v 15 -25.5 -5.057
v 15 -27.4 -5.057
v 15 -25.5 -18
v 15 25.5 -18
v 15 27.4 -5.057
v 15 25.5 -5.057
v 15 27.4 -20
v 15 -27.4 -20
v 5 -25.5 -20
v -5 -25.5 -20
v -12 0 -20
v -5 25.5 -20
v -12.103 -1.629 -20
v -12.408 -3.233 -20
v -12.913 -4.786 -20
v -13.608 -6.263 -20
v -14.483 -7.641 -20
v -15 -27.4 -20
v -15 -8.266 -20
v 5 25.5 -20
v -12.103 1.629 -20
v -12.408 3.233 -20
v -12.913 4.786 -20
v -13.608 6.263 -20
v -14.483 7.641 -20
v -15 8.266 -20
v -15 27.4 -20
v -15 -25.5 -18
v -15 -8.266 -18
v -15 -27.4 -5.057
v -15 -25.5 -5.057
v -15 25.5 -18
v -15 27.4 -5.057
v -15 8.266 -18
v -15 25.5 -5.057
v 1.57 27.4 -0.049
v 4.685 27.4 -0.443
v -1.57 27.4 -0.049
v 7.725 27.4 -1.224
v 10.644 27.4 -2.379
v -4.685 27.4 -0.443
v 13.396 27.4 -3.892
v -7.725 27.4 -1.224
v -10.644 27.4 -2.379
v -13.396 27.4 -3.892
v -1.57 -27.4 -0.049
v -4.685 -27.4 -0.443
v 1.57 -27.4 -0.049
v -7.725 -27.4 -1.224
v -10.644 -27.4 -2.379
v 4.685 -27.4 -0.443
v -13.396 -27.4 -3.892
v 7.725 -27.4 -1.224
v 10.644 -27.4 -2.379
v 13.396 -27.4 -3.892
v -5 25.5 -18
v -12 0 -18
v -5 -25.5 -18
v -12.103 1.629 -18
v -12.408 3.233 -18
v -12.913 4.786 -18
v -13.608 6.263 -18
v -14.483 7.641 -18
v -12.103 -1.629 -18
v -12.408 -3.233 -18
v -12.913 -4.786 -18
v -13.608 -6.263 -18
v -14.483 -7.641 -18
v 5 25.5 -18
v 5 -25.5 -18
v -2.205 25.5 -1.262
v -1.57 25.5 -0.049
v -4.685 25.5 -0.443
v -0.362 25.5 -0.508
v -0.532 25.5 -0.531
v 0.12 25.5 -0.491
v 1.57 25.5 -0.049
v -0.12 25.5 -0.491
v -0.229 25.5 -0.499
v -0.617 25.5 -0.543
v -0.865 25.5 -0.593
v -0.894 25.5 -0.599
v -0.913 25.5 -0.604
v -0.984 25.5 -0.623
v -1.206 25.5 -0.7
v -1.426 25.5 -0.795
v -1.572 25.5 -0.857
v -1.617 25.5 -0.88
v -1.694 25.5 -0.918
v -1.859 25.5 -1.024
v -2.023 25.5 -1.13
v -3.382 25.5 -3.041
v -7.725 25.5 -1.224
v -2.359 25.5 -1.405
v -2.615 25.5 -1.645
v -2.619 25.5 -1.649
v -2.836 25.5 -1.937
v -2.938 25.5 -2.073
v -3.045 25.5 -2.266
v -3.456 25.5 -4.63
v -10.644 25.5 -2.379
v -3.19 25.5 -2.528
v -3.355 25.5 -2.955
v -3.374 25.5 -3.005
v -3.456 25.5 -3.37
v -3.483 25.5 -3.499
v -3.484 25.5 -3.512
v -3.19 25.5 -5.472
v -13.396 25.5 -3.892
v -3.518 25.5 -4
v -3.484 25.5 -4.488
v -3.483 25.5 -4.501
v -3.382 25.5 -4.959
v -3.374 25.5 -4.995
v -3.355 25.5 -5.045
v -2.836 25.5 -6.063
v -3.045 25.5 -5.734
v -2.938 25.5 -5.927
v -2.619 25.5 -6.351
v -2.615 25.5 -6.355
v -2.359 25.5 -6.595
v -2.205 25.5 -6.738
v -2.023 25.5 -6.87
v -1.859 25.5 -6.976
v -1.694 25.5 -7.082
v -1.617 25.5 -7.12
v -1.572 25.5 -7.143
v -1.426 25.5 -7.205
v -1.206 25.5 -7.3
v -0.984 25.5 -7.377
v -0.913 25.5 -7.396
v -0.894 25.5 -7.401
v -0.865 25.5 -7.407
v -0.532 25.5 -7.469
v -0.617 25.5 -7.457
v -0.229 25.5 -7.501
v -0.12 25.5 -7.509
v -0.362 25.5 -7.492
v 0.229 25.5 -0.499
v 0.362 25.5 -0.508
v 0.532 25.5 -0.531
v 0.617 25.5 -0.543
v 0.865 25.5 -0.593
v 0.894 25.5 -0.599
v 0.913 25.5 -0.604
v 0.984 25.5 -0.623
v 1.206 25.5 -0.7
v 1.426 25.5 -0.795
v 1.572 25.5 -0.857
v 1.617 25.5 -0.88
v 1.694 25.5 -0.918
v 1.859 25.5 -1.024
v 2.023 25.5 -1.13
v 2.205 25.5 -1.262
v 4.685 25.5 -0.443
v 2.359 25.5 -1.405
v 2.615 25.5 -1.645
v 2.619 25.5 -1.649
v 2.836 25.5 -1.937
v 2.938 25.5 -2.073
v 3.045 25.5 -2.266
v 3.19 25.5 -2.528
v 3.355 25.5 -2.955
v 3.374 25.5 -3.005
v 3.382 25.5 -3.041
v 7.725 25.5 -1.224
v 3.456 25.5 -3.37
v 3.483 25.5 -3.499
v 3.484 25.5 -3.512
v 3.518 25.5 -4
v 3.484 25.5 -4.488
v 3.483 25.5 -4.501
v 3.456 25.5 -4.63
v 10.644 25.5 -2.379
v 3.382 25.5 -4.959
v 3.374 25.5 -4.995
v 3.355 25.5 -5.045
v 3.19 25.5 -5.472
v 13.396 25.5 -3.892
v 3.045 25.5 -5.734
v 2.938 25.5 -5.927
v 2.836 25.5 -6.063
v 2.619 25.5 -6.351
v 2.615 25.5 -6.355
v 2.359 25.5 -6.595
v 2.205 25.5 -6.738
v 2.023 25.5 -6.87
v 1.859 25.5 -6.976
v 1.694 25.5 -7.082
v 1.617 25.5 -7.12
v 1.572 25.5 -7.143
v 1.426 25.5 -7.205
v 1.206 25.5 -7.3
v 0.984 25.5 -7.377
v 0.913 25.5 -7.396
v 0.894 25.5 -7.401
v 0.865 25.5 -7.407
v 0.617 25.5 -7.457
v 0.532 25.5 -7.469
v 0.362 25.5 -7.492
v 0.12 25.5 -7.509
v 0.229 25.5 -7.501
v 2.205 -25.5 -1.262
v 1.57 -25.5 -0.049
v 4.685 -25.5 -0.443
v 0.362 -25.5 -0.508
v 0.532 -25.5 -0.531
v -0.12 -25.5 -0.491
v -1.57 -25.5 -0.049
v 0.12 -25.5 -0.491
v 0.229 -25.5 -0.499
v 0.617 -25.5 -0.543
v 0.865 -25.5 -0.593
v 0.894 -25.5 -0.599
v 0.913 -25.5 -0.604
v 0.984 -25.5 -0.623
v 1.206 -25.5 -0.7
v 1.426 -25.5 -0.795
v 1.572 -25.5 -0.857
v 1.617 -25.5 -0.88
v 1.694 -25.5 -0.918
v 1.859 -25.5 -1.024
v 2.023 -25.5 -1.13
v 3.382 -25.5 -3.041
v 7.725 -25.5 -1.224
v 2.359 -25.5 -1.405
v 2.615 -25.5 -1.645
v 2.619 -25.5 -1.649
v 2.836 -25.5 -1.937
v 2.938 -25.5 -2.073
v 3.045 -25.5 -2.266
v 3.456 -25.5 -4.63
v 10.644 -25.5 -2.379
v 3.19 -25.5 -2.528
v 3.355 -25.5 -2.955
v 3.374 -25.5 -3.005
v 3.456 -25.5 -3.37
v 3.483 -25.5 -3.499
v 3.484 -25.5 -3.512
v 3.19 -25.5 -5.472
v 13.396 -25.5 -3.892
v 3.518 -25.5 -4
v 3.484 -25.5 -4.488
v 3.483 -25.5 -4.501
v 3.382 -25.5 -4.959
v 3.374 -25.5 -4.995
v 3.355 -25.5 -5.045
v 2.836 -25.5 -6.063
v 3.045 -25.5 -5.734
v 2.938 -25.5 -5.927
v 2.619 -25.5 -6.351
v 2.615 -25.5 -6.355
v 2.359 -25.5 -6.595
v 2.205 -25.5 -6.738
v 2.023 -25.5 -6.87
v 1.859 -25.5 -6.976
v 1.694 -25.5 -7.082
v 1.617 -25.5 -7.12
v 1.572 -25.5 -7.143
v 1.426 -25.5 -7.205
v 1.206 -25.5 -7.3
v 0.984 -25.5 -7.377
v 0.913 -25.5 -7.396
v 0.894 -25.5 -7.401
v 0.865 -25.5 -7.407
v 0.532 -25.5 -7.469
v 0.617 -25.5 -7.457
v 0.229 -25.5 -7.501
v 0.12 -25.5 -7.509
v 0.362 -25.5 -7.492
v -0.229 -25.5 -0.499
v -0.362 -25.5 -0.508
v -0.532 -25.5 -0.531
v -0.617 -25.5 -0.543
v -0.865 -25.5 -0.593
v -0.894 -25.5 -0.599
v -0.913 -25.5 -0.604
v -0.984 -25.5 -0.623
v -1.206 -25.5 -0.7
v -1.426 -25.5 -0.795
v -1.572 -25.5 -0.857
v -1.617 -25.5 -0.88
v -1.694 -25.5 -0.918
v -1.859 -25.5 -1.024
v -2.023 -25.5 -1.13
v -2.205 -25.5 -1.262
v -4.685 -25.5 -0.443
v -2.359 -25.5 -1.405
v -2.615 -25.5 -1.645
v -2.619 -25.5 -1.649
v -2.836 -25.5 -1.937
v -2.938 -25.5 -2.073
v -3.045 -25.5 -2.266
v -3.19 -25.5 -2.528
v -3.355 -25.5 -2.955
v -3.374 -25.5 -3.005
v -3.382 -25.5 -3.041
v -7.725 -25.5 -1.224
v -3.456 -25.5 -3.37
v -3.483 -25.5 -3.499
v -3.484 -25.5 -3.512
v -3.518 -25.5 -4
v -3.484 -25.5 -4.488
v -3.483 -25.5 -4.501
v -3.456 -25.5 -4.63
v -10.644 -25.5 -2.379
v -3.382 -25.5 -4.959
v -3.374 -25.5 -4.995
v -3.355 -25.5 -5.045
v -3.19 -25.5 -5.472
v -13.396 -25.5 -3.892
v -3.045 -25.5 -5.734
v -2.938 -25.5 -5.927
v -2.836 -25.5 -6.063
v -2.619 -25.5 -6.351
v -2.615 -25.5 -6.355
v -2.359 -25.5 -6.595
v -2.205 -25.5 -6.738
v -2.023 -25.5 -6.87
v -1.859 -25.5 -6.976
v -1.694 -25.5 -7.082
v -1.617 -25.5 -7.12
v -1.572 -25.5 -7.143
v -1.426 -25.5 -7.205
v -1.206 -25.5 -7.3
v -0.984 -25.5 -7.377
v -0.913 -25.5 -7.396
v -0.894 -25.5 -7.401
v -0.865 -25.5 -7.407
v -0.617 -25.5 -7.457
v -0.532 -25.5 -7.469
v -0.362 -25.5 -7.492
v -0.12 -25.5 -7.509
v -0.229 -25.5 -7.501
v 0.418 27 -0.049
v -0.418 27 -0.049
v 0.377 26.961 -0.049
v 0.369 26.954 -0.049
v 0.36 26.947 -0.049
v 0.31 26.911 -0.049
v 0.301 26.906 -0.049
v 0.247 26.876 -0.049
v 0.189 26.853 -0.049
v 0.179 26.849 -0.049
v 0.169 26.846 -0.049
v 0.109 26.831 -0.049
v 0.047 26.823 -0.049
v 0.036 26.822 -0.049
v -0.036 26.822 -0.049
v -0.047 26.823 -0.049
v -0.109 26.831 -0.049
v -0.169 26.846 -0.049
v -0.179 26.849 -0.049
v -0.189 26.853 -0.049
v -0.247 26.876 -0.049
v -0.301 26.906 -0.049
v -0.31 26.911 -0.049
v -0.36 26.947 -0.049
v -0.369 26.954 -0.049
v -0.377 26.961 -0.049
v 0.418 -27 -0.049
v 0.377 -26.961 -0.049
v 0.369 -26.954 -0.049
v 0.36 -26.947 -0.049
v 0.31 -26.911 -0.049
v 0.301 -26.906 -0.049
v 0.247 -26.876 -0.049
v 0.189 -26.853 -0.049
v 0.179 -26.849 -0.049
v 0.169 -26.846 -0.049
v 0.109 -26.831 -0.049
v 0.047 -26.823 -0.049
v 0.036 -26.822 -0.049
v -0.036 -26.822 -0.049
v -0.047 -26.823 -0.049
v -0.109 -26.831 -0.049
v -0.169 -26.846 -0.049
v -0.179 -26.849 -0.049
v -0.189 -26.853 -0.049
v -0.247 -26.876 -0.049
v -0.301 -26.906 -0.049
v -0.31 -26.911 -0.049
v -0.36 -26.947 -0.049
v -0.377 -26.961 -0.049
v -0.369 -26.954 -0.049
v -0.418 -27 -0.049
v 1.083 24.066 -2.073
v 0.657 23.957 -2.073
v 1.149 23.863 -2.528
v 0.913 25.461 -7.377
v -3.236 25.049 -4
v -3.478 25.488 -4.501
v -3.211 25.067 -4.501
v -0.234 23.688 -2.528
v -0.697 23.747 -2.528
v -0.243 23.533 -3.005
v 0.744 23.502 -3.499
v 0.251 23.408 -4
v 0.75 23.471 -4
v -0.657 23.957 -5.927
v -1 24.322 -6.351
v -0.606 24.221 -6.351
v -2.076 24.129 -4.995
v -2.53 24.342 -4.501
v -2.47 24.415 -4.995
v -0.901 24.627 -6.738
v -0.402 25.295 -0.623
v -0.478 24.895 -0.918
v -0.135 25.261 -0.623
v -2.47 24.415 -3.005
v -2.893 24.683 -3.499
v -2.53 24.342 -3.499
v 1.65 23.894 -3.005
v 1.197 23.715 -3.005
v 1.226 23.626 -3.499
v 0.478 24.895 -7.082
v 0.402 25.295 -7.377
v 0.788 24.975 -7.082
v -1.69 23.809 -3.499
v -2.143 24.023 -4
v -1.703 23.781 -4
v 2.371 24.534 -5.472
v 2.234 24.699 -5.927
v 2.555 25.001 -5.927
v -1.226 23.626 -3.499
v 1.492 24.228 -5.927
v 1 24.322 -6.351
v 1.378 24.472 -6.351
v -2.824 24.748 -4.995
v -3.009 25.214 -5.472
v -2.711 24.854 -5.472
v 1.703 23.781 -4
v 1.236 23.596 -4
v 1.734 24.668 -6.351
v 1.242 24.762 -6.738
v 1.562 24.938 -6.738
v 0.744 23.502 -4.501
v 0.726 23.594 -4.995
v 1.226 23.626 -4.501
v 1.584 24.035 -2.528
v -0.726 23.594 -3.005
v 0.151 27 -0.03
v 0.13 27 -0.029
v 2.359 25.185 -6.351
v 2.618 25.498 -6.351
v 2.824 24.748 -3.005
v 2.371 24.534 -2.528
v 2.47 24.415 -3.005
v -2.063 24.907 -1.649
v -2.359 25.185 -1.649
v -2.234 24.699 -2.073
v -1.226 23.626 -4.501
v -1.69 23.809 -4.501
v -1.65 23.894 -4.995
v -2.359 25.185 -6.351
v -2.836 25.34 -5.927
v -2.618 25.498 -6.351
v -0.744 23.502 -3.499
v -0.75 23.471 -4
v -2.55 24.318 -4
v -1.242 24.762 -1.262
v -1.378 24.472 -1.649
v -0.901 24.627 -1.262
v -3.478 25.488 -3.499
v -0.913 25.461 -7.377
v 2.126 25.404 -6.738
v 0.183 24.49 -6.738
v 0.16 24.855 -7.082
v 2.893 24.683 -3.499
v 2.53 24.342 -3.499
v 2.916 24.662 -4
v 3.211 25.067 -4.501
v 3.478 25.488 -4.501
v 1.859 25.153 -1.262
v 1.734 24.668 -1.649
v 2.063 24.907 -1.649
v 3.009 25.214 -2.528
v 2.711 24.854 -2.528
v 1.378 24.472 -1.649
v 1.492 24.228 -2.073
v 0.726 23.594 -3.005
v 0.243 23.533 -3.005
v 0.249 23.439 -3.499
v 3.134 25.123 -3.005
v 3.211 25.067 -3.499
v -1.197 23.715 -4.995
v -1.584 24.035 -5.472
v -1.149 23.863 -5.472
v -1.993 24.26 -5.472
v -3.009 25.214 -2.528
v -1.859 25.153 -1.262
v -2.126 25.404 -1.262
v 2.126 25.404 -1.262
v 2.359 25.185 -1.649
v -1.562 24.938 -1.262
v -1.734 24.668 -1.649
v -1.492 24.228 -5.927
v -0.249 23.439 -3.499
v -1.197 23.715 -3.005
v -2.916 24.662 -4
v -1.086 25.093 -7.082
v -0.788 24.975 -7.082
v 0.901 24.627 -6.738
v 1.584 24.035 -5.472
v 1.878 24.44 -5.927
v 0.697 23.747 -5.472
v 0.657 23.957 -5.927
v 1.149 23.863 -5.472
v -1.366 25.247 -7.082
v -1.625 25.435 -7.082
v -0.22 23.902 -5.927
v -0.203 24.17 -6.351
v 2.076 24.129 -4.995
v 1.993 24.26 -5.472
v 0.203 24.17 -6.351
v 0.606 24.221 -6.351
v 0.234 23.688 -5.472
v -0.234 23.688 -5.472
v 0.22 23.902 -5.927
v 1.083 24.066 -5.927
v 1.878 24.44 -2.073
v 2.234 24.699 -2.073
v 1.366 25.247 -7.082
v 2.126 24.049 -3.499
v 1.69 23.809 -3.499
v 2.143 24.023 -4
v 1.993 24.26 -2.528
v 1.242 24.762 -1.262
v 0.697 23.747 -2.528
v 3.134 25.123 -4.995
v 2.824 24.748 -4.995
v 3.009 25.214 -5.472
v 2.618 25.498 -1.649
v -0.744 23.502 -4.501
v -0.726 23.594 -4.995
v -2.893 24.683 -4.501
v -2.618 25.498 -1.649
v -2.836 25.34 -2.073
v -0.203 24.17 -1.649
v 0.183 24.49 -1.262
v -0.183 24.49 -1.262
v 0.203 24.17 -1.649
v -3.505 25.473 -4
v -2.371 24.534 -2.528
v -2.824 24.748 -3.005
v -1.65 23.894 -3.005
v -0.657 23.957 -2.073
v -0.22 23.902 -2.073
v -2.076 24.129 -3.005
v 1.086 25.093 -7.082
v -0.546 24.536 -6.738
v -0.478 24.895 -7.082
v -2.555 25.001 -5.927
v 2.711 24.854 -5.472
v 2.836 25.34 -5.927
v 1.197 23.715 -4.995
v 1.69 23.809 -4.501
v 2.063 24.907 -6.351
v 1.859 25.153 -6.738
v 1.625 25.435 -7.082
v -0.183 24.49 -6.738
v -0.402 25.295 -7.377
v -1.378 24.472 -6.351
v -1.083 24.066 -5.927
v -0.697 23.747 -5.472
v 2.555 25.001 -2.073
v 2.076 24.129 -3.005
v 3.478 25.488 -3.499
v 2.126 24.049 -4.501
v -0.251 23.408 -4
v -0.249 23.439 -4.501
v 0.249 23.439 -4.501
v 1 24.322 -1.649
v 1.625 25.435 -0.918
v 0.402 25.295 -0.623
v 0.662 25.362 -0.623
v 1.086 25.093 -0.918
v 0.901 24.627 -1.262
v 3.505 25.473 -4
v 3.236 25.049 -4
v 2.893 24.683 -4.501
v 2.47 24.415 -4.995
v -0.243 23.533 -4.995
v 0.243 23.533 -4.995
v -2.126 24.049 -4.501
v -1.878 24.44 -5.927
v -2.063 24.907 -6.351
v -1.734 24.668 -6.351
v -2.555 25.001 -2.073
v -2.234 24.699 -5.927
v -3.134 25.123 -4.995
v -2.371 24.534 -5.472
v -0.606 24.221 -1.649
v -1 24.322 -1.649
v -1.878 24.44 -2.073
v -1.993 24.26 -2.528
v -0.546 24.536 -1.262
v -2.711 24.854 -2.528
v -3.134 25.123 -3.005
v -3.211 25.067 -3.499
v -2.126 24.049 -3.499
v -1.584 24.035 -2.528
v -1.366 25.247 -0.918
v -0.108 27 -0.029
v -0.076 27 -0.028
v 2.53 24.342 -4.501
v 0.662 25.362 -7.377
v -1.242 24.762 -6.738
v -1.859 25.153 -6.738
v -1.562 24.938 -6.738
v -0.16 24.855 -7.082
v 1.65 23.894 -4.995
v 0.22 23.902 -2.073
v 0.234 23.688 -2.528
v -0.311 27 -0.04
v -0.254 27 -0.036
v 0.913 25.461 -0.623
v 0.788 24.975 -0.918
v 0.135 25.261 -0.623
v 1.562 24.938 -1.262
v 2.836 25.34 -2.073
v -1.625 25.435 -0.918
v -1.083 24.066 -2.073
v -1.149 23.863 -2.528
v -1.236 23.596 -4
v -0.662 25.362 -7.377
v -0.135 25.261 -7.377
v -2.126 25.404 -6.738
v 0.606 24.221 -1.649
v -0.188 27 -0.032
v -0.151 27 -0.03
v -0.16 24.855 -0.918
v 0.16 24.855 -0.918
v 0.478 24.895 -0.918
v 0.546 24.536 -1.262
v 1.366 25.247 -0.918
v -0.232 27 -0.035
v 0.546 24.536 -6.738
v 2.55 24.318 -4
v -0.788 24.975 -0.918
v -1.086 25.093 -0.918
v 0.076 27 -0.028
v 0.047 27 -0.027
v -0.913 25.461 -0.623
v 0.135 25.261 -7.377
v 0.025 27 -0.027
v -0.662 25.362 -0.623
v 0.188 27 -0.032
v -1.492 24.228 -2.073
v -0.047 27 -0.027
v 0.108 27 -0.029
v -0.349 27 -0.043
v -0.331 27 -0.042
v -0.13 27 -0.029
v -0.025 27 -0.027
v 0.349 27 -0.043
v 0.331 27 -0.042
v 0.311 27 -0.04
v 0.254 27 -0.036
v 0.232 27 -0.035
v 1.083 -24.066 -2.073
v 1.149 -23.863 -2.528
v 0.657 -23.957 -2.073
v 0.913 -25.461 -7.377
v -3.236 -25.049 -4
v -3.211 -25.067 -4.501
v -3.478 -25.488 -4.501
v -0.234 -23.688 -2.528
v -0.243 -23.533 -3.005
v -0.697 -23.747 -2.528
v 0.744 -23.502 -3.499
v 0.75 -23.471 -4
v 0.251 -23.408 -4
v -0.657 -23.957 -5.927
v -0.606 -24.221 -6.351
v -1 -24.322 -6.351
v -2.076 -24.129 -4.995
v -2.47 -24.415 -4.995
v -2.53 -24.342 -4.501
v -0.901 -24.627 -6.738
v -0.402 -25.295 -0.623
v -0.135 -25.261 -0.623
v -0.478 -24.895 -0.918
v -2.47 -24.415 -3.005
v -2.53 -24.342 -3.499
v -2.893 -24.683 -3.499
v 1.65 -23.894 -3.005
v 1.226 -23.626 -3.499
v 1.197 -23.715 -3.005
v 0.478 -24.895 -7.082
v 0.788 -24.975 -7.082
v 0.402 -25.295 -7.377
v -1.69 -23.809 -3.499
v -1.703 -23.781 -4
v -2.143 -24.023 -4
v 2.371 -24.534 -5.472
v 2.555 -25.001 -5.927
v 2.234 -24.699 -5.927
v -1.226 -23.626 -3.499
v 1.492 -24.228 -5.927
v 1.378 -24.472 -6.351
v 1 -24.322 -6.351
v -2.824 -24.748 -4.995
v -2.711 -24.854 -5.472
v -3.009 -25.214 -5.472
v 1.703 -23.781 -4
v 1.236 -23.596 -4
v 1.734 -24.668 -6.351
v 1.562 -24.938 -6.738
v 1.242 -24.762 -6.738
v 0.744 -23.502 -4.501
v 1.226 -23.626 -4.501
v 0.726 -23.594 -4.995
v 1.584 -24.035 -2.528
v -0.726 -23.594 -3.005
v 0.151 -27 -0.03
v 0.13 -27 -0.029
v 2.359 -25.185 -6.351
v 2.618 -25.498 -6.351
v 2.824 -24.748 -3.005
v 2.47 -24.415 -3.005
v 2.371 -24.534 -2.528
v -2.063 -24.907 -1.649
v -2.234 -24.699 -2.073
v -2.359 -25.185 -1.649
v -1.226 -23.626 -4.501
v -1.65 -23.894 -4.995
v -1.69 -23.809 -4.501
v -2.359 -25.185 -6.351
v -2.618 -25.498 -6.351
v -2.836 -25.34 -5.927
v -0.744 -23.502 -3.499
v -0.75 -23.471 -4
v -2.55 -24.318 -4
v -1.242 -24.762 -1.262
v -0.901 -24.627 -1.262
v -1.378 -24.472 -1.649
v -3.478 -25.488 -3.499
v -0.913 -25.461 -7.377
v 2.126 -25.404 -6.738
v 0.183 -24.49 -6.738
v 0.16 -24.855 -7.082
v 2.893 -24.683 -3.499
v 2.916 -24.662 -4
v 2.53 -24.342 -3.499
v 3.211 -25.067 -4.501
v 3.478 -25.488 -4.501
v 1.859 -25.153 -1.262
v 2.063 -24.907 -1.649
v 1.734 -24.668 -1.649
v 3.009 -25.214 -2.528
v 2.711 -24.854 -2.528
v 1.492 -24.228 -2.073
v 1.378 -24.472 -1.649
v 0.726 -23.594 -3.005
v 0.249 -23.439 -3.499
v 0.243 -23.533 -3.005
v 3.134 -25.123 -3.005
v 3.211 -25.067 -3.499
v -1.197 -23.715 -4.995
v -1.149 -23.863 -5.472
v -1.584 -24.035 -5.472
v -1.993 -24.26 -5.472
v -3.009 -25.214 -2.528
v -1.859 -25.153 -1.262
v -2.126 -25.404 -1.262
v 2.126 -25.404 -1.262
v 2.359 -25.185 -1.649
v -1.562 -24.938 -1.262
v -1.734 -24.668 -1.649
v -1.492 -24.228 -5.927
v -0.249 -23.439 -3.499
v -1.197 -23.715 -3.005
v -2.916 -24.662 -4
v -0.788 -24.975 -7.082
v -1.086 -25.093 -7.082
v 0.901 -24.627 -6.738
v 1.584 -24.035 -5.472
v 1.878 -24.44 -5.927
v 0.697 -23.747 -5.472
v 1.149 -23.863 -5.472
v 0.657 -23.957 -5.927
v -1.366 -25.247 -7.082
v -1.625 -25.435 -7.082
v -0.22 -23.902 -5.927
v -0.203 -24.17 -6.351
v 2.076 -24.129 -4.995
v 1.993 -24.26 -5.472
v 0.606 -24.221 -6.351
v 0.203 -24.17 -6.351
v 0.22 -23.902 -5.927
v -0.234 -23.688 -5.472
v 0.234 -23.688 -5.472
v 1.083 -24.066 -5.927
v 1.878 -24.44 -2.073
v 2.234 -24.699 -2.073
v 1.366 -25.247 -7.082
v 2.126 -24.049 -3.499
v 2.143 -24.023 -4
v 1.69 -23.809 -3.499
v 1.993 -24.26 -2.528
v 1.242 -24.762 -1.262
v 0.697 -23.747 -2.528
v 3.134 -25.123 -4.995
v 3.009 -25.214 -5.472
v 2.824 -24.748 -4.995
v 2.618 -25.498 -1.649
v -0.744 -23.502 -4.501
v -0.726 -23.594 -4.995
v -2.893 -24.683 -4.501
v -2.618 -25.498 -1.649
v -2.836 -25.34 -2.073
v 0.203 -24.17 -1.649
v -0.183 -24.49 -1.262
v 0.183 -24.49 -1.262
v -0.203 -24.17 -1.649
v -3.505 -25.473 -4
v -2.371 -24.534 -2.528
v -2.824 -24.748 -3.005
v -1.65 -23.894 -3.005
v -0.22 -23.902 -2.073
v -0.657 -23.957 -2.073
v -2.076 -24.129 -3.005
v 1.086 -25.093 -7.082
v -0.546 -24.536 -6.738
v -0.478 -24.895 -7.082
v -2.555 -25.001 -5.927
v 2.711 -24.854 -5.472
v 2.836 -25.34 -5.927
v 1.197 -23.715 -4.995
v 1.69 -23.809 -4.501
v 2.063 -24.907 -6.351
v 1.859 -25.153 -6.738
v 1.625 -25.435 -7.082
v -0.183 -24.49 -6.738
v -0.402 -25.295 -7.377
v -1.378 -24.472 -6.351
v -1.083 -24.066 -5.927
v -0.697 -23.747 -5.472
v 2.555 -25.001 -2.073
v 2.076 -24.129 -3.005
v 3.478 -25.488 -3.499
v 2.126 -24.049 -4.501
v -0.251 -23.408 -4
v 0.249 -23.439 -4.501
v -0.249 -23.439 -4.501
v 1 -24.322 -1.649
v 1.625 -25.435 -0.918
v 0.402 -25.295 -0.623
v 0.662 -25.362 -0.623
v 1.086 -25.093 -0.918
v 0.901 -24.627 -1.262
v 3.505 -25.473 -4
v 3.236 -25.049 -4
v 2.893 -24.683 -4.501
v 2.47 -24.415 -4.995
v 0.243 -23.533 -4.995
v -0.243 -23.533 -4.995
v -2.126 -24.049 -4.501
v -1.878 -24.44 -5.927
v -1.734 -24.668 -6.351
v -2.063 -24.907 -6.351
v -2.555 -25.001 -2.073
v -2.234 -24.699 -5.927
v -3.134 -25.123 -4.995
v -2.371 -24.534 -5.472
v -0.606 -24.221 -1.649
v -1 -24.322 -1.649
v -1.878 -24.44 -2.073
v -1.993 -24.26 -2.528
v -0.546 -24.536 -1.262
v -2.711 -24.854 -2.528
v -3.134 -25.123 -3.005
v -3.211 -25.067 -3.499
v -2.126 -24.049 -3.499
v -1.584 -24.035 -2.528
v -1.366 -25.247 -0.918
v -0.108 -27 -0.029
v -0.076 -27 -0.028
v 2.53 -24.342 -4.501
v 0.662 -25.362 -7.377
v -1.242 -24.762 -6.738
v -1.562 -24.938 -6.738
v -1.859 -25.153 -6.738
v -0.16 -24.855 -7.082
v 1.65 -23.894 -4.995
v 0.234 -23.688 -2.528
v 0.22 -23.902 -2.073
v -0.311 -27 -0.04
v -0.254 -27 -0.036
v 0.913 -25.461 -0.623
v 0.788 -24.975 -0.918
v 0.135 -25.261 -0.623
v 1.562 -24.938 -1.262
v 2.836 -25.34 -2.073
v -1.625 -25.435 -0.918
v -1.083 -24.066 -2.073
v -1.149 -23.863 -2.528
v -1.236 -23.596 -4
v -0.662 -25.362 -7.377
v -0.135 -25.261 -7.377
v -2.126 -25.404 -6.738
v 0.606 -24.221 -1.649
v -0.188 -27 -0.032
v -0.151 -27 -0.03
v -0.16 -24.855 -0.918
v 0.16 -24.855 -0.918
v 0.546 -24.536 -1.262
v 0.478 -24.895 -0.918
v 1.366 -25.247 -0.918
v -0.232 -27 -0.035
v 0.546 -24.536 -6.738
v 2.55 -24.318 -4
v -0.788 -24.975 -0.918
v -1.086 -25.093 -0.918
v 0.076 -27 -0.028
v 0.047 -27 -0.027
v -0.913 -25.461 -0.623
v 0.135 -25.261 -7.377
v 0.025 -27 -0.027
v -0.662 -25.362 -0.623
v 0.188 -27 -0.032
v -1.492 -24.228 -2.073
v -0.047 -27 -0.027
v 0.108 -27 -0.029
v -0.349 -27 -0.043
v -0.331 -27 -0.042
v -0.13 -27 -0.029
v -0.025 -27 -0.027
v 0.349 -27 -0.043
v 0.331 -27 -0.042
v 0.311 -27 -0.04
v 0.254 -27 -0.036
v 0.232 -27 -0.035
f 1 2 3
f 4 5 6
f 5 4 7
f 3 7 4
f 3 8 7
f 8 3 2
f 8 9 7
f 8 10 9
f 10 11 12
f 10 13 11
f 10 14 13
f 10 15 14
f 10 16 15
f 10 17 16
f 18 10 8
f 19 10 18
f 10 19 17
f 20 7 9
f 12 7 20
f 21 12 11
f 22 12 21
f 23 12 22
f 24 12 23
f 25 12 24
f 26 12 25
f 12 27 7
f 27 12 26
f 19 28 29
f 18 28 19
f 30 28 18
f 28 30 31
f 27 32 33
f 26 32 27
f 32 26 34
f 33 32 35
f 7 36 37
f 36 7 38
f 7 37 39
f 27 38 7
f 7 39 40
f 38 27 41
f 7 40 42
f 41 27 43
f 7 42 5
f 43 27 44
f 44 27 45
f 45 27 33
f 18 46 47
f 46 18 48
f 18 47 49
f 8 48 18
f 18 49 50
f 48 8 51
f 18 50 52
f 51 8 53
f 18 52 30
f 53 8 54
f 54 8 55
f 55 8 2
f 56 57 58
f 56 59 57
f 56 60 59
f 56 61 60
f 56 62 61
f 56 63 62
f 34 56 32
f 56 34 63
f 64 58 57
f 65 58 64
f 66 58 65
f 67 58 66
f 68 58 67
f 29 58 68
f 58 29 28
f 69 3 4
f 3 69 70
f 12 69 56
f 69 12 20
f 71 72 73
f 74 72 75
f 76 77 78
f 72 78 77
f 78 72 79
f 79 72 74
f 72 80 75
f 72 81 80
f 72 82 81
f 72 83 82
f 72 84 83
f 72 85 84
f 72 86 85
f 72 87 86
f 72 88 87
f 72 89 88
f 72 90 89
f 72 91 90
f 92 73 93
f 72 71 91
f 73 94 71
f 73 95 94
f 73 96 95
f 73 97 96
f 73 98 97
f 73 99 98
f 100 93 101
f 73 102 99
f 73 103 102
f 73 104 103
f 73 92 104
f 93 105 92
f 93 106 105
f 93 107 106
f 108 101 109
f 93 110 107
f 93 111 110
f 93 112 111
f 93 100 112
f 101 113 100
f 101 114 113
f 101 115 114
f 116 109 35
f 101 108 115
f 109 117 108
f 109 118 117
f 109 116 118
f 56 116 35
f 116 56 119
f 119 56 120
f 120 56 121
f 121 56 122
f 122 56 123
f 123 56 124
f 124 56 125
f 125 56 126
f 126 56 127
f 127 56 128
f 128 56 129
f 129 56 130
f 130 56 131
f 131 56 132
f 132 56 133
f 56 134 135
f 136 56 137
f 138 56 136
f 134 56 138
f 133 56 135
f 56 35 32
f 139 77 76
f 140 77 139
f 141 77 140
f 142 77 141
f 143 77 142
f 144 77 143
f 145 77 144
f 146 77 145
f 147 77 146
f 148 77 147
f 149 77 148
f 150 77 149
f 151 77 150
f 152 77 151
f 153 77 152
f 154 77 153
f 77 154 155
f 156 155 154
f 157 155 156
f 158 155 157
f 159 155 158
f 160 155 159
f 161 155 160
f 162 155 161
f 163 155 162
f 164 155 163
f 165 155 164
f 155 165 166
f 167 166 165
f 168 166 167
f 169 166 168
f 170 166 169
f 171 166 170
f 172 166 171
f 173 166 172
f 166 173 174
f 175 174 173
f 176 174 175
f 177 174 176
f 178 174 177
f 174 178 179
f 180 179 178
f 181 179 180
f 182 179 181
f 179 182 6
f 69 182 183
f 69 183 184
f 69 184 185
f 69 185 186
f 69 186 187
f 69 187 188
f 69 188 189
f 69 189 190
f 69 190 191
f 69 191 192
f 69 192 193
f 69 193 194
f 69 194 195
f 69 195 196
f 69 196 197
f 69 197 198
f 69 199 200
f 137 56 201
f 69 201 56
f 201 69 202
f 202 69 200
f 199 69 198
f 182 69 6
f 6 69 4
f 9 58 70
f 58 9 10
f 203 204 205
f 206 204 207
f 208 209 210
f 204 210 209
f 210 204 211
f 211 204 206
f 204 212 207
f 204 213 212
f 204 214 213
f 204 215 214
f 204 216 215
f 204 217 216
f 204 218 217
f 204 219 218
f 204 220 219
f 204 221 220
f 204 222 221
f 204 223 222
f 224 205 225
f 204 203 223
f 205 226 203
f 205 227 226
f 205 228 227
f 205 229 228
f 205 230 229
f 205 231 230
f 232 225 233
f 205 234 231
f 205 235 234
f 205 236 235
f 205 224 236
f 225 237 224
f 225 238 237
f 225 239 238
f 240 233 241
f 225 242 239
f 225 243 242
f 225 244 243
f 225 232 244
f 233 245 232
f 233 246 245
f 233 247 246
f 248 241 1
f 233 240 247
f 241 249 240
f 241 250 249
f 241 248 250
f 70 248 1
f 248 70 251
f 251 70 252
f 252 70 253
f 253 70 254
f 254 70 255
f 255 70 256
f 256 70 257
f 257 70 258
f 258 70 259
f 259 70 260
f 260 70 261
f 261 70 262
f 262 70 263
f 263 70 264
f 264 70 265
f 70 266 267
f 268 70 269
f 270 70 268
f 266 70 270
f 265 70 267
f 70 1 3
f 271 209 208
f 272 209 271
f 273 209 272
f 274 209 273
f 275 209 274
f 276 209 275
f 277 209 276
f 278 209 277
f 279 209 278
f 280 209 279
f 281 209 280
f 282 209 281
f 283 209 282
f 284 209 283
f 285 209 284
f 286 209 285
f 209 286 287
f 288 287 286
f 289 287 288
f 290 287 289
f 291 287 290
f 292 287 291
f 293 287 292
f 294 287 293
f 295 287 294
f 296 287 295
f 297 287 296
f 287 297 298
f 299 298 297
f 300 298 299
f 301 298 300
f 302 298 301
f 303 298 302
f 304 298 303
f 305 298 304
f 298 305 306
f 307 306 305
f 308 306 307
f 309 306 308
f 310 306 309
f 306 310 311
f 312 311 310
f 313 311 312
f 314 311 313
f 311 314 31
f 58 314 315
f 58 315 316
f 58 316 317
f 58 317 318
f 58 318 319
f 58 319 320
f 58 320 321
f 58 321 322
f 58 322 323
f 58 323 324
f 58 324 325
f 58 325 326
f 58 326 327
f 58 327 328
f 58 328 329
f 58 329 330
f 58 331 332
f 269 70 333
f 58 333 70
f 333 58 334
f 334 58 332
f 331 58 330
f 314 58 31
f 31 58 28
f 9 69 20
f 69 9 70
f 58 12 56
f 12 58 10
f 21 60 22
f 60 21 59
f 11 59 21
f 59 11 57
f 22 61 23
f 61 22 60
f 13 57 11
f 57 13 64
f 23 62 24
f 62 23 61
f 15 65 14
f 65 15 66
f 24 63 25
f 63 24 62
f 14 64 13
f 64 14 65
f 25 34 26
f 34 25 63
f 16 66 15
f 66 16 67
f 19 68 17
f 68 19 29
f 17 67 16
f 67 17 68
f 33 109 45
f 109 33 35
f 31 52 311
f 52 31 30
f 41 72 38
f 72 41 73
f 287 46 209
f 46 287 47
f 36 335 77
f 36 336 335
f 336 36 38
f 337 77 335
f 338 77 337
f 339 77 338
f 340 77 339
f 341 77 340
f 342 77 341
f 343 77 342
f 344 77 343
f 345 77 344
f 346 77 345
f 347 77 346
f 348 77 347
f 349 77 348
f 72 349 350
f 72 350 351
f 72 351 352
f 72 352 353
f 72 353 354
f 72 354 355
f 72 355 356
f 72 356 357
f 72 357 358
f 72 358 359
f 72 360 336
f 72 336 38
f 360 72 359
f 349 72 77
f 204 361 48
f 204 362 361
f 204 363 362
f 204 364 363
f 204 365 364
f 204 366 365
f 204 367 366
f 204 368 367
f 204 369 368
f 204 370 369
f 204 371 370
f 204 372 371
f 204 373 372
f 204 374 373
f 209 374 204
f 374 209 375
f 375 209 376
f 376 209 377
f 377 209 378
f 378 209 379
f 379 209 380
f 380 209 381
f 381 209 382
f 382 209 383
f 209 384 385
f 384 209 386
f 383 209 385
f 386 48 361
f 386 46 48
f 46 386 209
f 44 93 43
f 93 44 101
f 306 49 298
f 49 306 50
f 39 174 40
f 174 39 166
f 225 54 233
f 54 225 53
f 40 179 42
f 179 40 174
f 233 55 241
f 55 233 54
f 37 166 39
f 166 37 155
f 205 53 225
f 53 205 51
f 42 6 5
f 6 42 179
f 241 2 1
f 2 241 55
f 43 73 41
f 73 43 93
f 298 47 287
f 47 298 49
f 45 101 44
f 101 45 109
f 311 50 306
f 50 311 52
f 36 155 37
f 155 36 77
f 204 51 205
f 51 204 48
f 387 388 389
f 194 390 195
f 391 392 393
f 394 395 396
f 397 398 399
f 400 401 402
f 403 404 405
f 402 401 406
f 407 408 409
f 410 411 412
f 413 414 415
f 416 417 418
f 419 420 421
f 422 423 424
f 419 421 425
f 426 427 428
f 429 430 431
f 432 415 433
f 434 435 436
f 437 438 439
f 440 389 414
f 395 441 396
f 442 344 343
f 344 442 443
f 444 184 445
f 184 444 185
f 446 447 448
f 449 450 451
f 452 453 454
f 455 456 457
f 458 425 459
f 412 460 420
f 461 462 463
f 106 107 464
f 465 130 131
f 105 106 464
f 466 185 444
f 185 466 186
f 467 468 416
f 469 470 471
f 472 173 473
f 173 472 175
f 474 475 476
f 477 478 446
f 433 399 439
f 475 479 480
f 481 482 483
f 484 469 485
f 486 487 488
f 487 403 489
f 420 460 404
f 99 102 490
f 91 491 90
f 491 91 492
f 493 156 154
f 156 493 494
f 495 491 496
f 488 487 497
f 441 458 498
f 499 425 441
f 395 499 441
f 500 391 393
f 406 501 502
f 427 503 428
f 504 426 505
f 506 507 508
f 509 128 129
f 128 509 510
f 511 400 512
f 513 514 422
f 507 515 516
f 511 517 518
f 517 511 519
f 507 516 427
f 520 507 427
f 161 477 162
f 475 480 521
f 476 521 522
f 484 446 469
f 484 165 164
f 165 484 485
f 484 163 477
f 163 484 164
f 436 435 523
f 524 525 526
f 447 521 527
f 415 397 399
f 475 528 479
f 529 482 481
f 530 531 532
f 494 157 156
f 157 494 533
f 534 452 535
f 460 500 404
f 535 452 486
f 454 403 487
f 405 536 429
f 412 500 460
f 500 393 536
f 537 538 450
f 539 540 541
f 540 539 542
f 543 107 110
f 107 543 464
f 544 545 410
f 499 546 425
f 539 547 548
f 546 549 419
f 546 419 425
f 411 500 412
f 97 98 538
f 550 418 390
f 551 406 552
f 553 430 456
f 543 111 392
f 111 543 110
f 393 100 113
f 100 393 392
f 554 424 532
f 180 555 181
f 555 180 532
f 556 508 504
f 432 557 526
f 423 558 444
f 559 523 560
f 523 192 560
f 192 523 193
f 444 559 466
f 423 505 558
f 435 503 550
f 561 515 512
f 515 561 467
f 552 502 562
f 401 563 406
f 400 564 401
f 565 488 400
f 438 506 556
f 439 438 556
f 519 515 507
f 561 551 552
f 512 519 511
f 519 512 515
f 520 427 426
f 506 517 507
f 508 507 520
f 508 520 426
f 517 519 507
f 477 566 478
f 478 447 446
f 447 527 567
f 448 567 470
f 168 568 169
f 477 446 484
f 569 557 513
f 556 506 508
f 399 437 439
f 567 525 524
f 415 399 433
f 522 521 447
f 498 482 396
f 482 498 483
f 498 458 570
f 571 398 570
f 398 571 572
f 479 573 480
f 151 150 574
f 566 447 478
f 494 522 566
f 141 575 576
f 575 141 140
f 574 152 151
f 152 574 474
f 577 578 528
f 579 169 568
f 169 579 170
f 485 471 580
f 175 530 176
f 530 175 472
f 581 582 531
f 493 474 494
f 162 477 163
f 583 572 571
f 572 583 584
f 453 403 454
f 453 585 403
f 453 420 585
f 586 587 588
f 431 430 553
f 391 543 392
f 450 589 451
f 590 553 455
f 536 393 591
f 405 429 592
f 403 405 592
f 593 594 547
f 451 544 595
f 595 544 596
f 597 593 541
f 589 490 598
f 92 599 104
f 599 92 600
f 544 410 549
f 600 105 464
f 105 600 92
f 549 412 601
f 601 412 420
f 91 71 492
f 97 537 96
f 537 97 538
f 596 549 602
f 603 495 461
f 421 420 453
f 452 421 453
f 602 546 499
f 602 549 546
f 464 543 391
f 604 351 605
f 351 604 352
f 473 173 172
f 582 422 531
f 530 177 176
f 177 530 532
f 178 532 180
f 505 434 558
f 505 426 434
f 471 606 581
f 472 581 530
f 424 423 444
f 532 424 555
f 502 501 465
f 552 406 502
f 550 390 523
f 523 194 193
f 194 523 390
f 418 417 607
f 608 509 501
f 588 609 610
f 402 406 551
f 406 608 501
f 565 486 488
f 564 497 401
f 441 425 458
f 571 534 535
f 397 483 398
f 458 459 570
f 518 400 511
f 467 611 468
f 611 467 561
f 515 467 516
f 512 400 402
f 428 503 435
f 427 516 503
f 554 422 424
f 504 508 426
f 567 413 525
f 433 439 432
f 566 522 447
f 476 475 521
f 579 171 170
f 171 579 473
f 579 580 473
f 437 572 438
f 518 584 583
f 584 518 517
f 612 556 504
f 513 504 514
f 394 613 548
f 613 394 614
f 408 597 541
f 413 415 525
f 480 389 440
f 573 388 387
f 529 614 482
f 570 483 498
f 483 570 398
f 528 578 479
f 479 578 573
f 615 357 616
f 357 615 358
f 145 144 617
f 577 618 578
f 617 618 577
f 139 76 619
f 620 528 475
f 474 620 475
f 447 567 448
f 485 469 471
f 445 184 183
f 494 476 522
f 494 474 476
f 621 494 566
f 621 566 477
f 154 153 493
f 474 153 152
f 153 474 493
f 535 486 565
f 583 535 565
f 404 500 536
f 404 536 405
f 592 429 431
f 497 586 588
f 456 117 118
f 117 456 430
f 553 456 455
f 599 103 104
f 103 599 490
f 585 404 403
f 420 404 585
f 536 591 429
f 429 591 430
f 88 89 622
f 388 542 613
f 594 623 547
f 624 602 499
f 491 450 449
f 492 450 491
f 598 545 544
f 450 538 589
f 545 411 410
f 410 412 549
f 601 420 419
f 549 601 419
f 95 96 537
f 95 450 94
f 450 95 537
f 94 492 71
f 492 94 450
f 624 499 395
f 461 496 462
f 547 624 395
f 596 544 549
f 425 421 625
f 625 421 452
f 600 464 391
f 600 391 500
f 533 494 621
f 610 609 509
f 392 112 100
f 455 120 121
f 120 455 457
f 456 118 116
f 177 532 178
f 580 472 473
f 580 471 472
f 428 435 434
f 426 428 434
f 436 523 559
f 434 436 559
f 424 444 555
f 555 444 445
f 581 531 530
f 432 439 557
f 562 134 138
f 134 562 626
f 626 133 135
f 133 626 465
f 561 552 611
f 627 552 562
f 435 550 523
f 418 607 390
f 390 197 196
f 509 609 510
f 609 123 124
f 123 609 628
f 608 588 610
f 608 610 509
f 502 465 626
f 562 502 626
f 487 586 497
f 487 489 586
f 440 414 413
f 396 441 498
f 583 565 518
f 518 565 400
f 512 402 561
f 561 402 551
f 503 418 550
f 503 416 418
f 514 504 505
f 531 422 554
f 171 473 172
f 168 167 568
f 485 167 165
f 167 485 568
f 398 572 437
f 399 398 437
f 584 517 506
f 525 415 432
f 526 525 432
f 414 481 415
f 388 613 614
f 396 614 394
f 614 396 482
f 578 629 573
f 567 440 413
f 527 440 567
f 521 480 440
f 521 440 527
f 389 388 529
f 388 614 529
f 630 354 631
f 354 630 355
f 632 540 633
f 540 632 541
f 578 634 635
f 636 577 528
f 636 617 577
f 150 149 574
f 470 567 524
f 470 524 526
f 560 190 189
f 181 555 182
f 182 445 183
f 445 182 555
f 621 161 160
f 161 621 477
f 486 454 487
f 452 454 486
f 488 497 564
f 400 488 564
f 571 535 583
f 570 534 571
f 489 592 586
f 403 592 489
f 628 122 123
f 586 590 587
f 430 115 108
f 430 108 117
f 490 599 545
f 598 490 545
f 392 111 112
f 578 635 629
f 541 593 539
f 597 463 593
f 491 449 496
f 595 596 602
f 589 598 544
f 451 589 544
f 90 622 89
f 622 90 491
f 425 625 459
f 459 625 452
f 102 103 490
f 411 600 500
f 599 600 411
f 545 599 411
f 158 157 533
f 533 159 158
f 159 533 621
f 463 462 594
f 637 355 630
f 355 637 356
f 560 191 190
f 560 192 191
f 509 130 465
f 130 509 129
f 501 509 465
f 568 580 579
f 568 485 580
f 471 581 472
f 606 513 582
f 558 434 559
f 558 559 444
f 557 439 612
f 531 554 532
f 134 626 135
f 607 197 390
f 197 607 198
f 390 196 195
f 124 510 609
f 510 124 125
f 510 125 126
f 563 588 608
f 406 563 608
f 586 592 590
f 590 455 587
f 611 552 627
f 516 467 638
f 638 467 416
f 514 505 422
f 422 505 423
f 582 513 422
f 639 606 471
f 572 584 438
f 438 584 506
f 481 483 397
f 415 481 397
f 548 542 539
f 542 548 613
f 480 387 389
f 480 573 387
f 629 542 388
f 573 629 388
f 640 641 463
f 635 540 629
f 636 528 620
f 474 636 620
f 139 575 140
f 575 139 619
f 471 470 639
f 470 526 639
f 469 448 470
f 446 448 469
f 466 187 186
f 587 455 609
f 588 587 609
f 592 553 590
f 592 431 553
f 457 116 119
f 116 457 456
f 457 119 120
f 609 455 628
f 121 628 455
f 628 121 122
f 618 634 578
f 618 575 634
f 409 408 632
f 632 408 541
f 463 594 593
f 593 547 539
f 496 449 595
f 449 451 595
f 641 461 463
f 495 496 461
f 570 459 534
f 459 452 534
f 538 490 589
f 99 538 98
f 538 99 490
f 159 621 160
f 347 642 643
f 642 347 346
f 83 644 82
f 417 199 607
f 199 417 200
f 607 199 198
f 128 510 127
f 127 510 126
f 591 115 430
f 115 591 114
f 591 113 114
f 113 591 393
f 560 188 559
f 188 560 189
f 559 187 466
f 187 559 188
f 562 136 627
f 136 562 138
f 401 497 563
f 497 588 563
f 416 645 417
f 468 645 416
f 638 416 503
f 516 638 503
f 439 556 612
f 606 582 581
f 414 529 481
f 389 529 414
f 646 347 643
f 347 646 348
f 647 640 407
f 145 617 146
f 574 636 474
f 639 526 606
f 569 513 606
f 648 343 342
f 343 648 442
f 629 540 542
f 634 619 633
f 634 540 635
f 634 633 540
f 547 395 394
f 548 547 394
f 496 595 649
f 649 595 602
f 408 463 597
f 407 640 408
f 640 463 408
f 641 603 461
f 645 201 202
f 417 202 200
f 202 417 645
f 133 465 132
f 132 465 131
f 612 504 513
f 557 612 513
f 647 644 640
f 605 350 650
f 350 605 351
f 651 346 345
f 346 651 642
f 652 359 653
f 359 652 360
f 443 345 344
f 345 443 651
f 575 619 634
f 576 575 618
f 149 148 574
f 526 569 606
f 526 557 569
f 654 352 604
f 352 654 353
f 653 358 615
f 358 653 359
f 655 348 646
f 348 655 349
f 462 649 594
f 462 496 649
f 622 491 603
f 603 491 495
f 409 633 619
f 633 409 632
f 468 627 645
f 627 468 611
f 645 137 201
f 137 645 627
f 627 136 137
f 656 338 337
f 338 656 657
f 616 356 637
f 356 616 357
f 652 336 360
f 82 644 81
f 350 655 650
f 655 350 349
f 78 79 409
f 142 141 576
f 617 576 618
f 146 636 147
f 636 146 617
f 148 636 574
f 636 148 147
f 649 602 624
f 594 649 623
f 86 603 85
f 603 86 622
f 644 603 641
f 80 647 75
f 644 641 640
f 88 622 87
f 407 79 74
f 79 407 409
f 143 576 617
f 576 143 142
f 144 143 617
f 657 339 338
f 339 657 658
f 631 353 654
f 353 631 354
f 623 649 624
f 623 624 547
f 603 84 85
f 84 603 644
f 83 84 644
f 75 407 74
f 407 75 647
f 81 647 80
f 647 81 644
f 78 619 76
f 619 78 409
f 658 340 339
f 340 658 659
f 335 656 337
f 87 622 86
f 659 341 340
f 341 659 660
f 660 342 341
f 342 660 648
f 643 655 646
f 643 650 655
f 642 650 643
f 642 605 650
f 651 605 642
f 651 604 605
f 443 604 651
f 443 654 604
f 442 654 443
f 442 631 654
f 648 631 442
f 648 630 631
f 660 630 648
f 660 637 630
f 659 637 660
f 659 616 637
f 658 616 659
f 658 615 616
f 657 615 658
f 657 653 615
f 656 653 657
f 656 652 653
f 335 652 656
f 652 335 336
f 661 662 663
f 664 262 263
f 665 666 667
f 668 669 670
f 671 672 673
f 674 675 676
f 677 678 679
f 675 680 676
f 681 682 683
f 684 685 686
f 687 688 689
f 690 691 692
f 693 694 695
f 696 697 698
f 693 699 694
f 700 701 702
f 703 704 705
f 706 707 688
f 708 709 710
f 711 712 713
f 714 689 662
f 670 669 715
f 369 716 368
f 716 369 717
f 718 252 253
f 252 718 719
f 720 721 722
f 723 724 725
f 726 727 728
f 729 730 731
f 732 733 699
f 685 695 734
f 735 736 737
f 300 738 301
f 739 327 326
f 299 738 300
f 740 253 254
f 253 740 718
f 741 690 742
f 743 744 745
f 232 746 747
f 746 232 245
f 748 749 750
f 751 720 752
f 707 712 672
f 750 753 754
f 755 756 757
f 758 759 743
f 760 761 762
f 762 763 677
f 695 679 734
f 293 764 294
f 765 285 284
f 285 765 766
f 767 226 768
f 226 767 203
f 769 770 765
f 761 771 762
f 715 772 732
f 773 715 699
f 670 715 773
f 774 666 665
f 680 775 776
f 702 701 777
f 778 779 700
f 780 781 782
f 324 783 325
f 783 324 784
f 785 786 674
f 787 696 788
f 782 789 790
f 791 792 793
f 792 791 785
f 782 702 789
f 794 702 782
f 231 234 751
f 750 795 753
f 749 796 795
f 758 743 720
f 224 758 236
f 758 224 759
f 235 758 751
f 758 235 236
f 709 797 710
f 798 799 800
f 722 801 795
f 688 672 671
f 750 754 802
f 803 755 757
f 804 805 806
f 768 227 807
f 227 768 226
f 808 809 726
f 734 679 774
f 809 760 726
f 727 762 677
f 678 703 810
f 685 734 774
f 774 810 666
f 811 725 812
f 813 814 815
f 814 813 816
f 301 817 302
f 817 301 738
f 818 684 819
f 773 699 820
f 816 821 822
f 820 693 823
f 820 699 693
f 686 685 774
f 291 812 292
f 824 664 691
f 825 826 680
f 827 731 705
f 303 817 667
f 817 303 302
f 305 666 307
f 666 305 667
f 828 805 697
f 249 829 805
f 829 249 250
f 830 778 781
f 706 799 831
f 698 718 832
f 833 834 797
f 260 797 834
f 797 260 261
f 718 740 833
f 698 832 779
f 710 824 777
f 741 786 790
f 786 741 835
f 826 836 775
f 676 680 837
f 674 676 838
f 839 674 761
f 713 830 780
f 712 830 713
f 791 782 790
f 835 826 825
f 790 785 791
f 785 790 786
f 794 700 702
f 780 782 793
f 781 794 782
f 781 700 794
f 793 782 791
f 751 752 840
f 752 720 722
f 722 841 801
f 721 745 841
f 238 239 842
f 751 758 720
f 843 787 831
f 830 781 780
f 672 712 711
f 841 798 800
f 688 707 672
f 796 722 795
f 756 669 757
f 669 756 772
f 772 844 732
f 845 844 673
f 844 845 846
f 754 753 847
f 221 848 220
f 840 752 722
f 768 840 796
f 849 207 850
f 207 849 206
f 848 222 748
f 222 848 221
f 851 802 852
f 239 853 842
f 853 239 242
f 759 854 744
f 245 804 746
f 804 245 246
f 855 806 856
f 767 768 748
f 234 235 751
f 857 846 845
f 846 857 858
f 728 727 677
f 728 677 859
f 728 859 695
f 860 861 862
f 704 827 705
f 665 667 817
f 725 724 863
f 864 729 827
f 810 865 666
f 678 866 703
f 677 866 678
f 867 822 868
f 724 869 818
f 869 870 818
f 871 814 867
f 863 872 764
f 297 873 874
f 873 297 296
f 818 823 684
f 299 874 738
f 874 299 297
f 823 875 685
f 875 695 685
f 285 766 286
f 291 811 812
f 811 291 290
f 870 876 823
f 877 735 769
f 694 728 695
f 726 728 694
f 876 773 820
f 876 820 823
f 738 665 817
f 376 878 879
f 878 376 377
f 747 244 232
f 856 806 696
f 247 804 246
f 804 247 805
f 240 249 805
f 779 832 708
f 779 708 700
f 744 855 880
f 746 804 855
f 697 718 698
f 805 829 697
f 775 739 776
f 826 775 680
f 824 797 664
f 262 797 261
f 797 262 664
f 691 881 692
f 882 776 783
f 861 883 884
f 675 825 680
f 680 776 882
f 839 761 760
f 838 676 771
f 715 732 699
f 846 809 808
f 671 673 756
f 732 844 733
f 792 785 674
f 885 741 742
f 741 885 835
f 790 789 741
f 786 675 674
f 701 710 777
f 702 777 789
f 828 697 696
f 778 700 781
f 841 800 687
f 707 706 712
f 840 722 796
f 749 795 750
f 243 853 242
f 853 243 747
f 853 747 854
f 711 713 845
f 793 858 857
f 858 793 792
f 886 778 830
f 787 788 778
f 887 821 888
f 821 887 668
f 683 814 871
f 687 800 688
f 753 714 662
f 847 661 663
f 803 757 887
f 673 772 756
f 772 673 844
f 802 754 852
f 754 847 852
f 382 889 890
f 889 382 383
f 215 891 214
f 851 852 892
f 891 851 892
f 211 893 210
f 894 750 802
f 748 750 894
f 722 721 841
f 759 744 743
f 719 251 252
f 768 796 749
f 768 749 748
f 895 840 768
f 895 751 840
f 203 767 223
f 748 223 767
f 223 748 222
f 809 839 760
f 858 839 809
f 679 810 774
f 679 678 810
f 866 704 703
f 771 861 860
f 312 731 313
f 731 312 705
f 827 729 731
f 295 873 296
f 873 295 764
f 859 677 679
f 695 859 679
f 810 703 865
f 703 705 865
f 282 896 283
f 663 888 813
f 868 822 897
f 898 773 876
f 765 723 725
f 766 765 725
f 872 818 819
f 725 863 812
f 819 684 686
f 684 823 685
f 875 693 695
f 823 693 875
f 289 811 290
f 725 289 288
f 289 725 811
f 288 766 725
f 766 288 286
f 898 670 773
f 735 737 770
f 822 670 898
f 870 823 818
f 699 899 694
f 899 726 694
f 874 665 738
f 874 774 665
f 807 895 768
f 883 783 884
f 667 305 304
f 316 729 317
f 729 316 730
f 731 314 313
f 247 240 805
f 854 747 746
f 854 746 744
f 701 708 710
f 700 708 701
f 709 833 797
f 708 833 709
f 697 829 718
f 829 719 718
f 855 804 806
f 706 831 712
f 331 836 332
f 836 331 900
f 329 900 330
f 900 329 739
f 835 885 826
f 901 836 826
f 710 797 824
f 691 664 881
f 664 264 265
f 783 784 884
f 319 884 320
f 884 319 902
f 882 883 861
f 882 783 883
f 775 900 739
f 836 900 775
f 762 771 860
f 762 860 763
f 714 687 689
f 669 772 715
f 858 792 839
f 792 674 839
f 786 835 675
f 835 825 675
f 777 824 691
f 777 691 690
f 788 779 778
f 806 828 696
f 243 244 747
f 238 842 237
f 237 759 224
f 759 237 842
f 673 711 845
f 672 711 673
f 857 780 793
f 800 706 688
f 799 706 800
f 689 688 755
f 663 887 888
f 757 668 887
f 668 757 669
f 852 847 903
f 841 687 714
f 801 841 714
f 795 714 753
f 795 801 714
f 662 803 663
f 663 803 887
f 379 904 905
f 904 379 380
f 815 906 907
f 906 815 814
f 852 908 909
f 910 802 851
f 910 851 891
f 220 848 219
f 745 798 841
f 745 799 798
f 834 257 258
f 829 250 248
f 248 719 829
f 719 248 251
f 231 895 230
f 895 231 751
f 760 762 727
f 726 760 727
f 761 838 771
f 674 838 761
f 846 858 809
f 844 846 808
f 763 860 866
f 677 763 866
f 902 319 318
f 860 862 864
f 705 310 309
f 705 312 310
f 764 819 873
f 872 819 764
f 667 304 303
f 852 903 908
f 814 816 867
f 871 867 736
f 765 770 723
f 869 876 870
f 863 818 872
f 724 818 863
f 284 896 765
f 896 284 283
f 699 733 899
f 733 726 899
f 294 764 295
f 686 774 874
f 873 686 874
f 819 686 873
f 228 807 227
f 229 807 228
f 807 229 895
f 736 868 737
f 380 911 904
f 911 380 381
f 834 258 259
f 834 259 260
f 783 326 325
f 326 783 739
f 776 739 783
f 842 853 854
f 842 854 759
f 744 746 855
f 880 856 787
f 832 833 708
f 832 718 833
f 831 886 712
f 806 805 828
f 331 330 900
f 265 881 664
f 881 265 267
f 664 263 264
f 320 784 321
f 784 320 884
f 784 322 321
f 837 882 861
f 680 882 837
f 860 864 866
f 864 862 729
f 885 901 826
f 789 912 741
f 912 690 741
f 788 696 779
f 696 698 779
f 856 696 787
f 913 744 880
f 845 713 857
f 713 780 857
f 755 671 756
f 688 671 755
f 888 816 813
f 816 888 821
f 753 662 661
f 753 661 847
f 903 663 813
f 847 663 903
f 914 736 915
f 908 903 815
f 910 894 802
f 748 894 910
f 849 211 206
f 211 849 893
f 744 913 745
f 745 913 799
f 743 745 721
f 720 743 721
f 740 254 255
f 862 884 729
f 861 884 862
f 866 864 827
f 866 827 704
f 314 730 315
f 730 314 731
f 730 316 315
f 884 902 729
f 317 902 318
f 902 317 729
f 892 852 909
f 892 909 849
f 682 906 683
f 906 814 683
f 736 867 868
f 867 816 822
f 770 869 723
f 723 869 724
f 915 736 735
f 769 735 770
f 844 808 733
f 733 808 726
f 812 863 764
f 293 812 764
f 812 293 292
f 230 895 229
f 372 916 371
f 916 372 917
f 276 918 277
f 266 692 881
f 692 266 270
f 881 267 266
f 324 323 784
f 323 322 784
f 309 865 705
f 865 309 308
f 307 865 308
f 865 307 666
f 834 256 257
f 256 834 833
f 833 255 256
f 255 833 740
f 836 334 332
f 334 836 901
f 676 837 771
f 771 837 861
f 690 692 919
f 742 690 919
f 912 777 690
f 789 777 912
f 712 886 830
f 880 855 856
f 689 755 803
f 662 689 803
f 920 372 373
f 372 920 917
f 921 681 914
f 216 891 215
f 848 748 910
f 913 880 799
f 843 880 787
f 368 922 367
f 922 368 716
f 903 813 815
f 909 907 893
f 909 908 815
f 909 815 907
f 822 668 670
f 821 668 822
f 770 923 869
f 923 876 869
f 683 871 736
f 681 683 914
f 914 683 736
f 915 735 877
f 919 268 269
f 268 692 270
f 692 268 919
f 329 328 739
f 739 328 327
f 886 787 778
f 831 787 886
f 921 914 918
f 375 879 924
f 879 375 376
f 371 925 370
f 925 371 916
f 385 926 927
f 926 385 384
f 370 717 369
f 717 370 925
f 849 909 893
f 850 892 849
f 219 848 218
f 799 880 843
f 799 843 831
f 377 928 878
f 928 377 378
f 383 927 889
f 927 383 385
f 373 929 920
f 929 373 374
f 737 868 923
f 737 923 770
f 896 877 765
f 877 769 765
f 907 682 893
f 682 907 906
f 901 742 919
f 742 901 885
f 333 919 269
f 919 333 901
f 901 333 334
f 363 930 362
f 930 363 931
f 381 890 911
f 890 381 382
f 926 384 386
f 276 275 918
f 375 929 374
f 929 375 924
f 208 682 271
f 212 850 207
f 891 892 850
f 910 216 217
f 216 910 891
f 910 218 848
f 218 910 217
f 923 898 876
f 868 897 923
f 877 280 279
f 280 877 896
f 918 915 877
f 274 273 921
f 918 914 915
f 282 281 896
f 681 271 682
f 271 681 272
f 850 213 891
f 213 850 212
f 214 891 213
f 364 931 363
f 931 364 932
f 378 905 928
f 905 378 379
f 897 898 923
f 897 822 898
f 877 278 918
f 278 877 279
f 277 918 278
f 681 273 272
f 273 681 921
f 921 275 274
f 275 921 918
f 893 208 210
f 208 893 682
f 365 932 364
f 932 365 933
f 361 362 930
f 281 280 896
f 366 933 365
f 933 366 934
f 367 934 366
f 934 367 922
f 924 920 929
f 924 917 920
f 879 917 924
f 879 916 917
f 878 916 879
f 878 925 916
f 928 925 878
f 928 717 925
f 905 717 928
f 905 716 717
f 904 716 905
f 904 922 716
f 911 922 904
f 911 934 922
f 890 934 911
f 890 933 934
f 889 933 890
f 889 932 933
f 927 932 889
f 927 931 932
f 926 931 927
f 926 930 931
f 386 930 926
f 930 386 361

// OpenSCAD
// Tape dispenser
// Made by Lucian Brandus
// teeth by Marcel Mommsen (and some stuff translated to english - incomplete)
// Detents by Jonas Schiller

tape_width = 51; // width rola
height = 20; // dispenser height
length = 30; // dispenser length
diametre_curvature = 50; // grip diameter
gap = 10; // gap
detent_radius=4;
add_teeth = "no"; // [yes,no]
enable_teeth = add_teeth == "yes";

/* [Hidden] */
width = tape_width + 1.9*2;

$fn=50;

tooth_size=1;
tooth_distance_factor=1.5;

corp();
if (enable_teeth) {
    teeth();
}
detent();
mirror([0,1,0]) detent();

// Module

module corp() {
    union()
    {
        intersection()
        {  
            // cilindru curbura aripi
            rotate([90, 0, 0])
            translate([0, -diametre_curvature/2, 0])
            cylinder(h = tape_width*2, d = diametre_curvature, center = true, $fn=50);
            // corp
            difference(){
                // corp dispenser
                translate([0, 0, -height/2])
                cube(size = [length,width,height], center = true);
                // cutout roll    
                translate([0, 0, 2-height/2])
                cube(size = [length+1,tape_width,height], center = true);
                // gap tape
                cube(size = [gap,tape_width,height*3], center = true); 
                // cutout finger
                translate([-length/2-10, 0, 0])    
                cylinder(h = tape_width*2, d = 26, center = true);
                // second cutout finger (remove this one for teeth)
//                if (!enable_teeth) {
//                    translate([length/2+10, 0, 0])    
//                    cylinder(h = tape_width*2, d = 26, center = true);
//                }
            }
        }    
    }
}

module teeth() {
    union()
    {
        for(a = [-tape_width/2:tooth_size*tooth_distance_factor:tape_width/2]) {
            translate([length/2-tooth_size, a, -height-tooth_size])    
            cylinder(h=tooth_size,r1=0,r2=tooth_size,$fn=4);
        }

    }
}

module detent() {
    difference(){ 
        translate([0,width/2,-detent_radius])
        sphere(r=detent_radius);
        translate([0,width/2+detent_radius,-detent_radius])
        cube(2.2*detent_radius, center=true);
    }
}
